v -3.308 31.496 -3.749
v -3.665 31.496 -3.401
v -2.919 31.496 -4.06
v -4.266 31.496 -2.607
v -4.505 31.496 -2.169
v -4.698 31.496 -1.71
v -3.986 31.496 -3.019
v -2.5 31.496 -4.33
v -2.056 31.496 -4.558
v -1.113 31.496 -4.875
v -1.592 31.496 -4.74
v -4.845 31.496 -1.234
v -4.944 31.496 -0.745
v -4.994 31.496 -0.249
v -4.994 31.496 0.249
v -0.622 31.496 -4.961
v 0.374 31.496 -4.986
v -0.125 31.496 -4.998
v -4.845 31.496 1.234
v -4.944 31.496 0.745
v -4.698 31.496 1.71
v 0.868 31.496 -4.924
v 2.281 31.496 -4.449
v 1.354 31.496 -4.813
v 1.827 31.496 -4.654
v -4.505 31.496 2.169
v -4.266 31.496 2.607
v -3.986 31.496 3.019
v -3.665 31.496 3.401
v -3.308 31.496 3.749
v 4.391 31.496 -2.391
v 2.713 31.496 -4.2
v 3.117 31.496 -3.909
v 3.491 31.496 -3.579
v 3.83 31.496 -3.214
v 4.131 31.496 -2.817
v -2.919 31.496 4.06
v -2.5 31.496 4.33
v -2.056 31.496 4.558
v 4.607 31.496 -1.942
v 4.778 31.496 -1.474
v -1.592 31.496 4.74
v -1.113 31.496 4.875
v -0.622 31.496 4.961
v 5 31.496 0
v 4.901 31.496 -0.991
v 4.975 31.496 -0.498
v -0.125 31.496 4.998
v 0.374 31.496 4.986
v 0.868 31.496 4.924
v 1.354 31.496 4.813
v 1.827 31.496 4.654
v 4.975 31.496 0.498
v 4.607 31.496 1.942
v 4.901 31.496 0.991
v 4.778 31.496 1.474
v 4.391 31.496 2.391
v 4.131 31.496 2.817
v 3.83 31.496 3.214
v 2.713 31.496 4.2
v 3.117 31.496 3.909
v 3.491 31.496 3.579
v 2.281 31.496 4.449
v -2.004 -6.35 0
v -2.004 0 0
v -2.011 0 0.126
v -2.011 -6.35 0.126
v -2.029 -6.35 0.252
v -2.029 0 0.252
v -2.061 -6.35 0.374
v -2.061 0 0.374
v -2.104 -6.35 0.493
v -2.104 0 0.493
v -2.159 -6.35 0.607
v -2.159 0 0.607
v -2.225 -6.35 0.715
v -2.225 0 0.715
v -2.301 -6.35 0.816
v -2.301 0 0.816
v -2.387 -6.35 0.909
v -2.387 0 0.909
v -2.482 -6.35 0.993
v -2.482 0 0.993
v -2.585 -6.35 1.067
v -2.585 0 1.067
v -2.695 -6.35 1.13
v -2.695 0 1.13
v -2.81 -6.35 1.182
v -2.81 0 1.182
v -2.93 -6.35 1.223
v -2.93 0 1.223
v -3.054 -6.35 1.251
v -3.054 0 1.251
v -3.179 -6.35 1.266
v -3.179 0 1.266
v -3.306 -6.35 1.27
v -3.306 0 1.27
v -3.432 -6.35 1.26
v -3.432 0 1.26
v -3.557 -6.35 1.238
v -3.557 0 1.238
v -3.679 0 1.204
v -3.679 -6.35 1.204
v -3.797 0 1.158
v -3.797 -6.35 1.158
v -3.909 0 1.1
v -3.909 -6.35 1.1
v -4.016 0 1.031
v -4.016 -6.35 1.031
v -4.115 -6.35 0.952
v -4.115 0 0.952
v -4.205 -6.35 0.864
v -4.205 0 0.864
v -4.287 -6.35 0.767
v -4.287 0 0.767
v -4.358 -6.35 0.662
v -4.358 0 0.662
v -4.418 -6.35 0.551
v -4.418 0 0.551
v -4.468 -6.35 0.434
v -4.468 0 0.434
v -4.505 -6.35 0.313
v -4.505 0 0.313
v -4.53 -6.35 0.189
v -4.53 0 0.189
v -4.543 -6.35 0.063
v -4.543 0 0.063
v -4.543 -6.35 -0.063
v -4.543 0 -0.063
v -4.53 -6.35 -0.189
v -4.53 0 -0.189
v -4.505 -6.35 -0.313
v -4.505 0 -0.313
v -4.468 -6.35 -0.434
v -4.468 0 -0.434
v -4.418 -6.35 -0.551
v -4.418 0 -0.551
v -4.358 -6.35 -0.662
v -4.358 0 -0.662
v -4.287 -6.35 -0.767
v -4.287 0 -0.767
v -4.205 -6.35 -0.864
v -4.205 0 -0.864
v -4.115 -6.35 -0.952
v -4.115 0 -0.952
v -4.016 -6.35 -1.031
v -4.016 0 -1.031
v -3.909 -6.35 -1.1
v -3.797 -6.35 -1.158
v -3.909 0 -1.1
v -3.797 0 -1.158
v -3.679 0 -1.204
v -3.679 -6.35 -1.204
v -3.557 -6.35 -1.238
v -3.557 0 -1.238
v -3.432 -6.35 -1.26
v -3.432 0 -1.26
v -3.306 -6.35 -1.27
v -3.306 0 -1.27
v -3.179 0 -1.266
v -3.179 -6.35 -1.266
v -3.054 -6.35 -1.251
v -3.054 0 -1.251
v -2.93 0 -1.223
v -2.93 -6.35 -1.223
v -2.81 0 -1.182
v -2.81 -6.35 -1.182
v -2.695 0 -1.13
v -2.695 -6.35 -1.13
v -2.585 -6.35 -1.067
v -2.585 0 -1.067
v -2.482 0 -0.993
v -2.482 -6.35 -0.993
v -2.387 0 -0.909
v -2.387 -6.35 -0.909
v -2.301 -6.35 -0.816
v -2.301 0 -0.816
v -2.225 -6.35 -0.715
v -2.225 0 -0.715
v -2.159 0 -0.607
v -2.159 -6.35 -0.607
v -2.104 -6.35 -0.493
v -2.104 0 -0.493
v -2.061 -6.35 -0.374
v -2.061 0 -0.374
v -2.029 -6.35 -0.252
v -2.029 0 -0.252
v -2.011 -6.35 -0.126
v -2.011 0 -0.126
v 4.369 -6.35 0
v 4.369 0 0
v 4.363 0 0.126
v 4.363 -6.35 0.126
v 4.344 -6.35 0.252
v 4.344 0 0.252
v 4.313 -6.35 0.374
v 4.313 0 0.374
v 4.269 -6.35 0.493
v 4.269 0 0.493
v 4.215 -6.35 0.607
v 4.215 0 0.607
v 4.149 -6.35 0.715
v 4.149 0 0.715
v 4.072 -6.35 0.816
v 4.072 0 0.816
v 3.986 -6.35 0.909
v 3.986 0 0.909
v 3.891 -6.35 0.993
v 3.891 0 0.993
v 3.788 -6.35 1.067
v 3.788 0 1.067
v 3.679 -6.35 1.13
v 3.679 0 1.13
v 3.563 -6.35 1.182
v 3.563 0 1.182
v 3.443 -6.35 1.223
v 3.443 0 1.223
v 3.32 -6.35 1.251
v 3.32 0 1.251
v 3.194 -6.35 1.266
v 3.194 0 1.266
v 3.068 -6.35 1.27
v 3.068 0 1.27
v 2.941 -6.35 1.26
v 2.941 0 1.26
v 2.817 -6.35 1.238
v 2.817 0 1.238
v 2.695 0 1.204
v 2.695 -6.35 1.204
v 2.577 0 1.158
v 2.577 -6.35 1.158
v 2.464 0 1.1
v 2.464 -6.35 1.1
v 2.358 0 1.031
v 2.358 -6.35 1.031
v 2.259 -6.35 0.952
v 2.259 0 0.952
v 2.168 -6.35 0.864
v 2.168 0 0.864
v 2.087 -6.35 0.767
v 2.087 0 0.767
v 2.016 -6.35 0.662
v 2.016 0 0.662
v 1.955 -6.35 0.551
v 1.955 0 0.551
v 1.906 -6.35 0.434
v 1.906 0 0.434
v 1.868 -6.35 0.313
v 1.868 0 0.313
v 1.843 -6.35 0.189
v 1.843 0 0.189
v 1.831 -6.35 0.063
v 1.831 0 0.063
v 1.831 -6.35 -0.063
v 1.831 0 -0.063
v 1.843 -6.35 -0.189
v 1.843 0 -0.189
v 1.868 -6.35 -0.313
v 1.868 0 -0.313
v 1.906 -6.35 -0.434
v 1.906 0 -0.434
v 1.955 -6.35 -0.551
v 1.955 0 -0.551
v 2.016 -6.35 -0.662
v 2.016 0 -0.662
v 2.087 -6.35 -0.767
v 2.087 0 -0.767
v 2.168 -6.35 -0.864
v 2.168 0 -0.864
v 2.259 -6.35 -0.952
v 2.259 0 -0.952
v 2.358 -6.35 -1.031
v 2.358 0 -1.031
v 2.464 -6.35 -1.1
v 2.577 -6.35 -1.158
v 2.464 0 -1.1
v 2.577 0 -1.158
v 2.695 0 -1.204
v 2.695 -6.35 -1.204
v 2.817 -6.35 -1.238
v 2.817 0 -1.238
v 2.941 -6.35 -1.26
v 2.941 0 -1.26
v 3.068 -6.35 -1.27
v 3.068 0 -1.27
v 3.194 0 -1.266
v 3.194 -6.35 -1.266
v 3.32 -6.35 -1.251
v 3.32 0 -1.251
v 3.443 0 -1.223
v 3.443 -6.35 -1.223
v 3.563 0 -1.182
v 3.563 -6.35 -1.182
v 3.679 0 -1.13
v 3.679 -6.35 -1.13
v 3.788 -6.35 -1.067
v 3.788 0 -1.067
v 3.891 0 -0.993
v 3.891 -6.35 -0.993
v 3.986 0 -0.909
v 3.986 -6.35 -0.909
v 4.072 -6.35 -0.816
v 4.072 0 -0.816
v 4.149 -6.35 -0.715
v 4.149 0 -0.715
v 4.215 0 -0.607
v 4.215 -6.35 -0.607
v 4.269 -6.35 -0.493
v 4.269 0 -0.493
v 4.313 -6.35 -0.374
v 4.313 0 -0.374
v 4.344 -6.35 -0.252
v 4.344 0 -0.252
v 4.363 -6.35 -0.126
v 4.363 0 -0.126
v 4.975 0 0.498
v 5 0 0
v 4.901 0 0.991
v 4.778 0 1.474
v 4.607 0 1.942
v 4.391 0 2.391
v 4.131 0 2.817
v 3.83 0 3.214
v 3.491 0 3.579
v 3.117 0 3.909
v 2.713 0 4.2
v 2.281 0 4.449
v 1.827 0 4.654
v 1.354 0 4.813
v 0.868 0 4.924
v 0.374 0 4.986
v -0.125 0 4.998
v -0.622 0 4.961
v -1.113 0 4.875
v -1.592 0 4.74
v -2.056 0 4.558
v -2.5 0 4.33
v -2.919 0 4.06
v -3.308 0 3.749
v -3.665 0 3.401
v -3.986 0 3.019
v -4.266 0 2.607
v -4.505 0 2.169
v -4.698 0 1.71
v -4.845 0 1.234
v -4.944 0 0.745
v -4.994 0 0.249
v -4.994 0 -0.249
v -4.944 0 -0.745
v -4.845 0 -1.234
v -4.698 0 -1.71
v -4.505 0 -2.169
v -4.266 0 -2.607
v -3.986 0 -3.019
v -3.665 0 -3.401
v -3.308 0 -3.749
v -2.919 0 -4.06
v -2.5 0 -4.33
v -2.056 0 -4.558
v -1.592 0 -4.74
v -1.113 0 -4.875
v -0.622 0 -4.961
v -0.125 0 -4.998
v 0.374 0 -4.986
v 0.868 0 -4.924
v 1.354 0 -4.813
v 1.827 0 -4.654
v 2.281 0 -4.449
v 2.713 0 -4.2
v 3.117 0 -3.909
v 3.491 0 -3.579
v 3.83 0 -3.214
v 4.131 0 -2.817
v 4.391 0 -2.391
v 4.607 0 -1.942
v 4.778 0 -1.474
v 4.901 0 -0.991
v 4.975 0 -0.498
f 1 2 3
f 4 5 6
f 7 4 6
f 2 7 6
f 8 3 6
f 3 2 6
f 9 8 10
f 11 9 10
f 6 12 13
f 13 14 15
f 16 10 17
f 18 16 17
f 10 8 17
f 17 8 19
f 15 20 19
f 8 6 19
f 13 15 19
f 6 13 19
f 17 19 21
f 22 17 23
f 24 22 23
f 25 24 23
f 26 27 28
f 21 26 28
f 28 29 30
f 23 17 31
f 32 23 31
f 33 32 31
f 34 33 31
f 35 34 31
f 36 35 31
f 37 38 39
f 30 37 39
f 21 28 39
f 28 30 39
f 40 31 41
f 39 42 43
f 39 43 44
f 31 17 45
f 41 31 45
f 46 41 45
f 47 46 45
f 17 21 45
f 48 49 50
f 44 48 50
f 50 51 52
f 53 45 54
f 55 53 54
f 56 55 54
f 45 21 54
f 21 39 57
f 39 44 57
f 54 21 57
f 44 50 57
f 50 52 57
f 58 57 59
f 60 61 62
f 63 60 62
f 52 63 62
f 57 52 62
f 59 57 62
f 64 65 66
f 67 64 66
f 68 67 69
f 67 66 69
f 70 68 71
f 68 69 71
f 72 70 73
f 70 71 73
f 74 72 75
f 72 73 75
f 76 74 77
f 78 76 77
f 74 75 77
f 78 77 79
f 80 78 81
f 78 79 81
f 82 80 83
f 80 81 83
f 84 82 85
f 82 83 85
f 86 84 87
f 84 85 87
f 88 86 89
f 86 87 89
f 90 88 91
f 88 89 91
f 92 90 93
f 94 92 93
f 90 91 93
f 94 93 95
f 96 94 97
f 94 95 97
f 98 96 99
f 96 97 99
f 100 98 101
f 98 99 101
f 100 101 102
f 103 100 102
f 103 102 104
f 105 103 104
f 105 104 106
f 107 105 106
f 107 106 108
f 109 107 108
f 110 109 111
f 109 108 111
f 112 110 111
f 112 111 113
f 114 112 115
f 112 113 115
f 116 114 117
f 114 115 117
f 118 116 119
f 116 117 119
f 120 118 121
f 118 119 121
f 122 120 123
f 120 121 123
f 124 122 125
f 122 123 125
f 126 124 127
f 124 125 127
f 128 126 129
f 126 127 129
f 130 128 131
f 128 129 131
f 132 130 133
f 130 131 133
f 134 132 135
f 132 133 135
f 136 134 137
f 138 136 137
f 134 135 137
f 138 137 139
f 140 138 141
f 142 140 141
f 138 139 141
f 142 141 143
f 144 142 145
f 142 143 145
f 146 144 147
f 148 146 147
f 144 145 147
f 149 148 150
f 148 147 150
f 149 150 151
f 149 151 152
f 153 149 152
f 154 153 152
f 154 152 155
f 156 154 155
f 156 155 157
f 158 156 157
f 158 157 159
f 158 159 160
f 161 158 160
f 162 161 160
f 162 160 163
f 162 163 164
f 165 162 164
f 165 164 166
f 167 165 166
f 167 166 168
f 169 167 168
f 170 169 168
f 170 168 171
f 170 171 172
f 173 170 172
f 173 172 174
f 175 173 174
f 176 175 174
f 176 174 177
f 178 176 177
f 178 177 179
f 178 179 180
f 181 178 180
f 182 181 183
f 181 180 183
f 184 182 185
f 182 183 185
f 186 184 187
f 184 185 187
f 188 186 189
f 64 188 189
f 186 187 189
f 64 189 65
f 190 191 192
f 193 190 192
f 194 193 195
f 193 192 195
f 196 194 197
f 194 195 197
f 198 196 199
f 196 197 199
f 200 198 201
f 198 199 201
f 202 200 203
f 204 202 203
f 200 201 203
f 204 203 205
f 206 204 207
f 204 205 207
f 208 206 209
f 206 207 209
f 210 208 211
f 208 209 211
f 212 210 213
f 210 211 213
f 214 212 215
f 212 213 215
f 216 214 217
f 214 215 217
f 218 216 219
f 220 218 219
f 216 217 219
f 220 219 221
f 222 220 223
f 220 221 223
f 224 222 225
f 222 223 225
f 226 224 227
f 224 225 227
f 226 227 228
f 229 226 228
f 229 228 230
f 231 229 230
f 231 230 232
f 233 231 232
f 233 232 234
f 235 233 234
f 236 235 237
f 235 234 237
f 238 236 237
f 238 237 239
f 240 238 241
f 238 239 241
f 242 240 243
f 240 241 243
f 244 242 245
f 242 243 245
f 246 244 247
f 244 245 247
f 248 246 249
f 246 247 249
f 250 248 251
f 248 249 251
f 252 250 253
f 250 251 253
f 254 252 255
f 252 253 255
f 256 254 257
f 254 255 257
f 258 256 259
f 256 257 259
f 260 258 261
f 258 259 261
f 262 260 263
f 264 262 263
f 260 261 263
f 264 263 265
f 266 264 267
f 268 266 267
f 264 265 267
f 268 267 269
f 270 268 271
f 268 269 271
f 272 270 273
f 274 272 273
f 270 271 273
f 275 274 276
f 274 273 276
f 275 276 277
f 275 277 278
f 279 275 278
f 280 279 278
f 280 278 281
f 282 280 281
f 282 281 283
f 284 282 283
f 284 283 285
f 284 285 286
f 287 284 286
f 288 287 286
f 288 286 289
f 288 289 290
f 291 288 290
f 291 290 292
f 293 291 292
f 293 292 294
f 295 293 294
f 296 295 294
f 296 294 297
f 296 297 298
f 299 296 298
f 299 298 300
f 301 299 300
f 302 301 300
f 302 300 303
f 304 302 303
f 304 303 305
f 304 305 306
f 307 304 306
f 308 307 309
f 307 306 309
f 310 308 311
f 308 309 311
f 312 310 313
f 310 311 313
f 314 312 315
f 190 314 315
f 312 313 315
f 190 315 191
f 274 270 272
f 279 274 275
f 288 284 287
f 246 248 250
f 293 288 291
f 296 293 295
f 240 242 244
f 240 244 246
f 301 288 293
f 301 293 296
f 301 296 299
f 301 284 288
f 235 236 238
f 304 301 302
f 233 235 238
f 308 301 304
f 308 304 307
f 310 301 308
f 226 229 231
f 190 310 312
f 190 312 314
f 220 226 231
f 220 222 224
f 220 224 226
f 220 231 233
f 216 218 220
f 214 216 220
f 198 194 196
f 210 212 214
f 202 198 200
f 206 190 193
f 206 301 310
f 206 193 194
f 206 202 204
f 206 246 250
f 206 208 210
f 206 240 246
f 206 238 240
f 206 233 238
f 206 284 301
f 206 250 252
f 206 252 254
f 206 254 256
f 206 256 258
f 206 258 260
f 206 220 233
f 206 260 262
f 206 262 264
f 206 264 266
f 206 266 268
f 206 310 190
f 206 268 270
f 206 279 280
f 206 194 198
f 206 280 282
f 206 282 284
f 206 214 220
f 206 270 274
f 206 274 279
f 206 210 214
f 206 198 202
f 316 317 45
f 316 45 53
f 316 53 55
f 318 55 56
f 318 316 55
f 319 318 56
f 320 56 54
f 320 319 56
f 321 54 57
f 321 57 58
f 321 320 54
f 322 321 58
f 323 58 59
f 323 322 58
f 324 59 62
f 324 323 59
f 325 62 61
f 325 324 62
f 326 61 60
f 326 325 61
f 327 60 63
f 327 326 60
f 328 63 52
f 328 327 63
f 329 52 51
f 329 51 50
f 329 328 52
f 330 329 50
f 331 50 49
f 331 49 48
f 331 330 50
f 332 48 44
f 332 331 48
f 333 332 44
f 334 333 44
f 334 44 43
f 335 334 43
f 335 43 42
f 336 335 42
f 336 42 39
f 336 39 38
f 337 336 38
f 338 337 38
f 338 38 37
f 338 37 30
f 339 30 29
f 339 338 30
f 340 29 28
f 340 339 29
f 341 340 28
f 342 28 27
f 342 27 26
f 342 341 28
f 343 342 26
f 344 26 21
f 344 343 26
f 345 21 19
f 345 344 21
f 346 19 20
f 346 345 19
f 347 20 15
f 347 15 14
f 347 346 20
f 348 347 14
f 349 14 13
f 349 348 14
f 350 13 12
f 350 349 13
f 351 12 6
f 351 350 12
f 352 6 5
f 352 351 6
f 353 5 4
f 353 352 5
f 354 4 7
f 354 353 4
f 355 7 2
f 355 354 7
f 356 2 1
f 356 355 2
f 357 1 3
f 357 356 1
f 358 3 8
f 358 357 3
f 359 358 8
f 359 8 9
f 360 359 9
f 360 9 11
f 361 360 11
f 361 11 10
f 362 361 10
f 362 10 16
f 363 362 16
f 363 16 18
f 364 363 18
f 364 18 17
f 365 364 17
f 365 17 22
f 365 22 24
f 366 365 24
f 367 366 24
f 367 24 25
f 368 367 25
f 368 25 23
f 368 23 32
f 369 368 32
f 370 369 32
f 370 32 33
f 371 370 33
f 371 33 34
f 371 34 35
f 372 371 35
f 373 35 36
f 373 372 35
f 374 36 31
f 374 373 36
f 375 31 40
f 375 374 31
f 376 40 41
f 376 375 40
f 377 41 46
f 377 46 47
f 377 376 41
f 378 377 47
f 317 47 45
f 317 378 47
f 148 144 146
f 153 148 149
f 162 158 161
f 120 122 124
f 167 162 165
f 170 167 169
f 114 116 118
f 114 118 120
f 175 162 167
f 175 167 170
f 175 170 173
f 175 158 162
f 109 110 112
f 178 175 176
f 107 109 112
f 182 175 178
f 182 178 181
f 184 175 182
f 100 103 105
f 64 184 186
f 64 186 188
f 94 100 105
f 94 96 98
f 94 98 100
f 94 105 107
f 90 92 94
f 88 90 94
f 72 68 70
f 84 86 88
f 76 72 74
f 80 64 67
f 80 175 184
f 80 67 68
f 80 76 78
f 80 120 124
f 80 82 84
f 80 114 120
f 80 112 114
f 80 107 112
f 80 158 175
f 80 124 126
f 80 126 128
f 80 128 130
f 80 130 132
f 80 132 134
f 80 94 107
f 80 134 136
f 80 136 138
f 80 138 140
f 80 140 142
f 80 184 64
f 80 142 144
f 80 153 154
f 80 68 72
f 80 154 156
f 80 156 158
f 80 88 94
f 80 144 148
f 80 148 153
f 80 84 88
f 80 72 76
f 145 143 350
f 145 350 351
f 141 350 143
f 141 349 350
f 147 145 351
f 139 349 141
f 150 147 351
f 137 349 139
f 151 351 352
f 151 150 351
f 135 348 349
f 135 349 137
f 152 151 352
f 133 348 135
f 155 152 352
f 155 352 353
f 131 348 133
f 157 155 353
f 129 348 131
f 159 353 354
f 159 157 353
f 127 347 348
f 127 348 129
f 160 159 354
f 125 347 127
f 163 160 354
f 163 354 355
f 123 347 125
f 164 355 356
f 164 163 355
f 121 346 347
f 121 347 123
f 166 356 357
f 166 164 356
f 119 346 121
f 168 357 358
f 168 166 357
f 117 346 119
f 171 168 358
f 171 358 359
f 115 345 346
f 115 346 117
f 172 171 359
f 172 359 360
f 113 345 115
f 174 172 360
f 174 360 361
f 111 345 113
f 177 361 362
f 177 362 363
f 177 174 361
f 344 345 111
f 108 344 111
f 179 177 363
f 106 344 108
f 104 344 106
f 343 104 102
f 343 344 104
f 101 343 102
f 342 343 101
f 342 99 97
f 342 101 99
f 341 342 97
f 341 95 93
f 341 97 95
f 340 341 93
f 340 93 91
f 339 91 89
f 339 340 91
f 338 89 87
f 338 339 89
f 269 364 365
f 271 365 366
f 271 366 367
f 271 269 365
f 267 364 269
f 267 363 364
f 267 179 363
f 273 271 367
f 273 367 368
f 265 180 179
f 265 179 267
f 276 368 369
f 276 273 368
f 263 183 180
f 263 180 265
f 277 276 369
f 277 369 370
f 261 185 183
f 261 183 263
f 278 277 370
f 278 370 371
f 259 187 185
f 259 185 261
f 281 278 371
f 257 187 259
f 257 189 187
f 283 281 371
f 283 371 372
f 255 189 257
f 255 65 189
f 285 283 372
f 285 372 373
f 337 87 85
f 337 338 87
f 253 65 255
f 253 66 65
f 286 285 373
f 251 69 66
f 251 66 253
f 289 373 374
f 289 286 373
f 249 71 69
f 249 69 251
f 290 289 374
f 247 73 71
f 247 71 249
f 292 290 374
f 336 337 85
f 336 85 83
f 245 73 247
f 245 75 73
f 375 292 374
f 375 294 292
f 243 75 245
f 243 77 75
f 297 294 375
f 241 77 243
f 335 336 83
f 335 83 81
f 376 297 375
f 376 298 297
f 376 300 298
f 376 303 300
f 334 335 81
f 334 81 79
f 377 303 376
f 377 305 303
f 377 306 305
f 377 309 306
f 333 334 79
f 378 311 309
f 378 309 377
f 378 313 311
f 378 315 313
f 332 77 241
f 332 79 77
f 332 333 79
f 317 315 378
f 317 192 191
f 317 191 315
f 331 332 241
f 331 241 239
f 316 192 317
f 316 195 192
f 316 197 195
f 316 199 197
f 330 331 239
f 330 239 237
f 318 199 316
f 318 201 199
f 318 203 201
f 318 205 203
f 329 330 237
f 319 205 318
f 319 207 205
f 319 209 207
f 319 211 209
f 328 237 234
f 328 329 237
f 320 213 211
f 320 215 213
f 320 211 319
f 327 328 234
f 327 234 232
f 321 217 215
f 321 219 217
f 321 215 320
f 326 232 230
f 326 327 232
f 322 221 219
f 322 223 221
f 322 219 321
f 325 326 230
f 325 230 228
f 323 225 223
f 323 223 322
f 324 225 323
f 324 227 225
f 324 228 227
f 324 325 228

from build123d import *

# Parameters (mm, degrees)
F0_R     = 4.99999
F1_DEPTH = 31.496
F2_R     = 1.27
F3_DEPTH = 6.35


with BuildPart() as f1:
    # F0 (on Front) → F1 (new body)
    with BuildSketch(Plane.XZ):
        Circle(F0_R)
    extrude(amount=-F1_DEPTH)

    # F2 (on face) → F3 (join)
    with BuildSketch(Plane.XZ):
        with Locations((-3.274196, 0)):
            Circle(F2_R)
        with Locations((3.099181, 0)):
            Circle(F2_R)
    extrude(amount=F3_DEPTH)


solid = f1.part
